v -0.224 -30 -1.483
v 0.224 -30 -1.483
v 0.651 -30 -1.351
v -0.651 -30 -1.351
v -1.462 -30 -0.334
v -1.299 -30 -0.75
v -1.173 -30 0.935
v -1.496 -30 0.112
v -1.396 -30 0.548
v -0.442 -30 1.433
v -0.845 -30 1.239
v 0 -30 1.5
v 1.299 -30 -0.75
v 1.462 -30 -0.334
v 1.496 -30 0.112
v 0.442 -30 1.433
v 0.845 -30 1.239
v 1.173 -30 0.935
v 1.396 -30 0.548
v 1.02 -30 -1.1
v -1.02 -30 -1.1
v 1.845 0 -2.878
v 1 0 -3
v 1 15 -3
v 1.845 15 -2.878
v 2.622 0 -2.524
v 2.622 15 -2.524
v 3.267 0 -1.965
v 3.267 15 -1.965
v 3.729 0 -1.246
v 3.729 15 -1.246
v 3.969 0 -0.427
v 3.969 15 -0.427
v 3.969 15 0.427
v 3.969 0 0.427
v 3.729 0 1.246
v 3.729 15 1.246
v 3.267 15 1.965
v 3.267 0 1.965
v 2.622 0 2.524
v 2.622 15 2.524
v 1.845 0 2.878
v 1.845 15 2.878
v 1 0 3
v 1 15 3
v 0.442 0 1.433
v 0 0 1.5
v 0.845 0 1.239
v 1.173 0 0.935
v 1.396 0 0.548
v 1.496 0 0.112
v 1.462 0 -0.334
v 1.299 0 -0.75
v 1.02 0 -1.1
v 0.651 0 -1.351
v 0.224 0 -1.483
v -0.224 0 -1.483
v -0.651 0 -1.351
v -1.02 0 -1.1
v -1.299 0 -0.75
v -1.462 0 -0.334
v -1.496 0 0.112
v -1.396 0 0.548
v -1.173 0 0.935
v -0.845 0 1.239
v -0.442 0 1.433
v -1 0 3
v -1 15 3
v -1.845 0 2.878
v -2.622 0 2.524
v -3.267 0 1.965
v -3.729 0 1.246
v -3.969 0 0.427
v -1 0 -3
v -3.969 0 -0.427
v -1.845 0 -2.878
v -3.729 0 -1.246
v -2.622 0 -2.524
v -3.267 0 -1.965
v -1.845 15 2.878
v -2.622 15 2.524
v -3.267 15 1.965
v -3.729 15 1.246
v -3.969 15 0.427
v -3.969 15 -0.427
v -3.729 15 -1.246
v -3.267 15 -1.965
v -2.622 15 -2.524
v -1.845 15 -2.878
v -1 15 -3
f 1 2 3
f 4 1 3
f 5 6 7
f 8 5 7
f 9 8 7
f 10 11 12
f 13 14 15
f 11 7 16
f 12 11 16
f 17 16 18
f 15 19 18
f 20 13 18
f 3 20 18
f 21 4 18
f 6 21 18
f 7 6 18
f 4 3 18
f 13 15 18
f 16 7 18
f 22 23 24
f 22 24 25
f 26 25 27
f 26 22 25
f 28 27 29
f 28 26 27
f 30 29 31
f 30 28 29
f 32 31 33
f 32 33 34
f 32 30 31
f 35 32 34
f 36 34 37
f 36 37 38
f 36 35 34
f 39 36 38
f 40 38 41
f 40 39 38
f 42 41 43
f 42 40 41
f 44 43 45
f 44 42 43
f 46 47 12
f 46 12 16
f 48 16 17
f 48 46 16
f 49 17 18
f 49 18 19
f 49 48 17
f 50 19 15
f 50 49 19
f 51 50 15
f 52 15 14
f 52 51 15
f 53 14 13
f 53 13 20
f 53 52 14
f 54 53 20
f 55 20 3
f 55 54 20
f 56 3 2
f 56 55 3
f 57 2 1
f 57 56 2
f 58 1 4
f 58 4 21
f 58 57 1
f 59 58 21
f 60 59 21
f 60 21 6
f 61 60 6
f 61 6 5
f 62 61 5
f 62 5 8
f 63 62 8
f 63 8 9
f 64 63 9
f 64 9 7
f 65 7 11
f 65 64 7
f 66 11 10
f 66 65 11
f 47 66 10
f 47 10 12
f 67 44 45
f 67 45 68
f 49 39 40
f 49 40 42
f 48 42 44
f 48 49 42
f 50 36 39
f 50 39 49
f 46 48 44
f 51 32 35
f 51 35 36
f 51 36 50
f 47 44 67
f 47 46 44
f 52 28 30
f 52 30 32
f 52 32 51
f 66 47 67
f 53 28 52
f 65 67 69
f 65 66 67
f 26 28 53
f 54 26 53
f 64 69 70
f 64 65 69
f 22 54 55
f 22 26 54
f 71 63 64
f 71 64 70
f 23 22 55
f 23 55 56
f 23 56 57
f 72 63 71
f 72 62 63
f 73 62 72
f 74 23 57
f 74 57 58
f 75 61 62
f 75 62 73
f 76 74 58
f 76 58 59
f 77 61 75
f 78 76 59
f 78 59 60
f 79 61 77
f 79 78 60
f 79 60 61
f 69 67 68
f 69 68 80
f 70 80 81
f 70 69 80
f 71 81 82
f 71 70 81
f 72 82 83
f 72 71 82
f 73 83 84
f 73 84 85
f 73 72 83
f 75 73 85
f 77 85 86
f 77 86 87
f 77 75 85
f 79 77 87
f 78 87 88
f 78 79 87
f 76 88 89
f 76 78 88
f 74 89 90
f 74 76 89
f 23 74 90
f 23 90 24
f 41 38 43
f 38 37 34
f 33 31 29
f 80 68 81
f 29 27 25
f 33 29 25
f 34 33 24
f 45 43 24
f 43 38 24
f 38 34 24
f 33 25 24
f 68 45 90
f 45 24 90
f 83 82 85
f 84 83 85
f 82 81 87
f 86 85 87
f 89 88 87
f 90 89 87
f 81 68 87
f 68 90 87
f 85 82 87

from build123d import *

# Parameters (mm, degrees)
EXTRUDE_1_DEPTH = 15
SKETCH_3_R      = 1.5
EXTRUDE_2_DEPTH = 30


with BuildPart() as part:
    # 草图2 → 凸台-拉伸1 (new body)
    with BuildSketch(Plane(origin=(0, 0, 0), x_dir=(1, 0, 0), z_dir=(0, 1, 0))):
        with BuildLine():
            Line((-1, 3), (1, 3))
            ThreePointArc((1, 3), (4, 0), (1, -3))
            Line((1, -3), (-1, -3))
            ThreePointArc((-1, -3), (-4, 0), (-1, 3))
        make_face()
    extrude(amount=EXTRUDE_1_DEPTH)

    # 草图3 → 凸台-拉伸2 (add)
    with BuildSketch(Plane(origin=(0, 0, 0), x_dir=(1, 0, 0), z_dir=(0, 1, 0))):
        with Locations(Location((0, 0, 0), (0, 0, 270))):
            Circle(SKETCH_3_R)
    extrude(amount=-EXTRUDE_2_DEPTH)


solid = part.part
